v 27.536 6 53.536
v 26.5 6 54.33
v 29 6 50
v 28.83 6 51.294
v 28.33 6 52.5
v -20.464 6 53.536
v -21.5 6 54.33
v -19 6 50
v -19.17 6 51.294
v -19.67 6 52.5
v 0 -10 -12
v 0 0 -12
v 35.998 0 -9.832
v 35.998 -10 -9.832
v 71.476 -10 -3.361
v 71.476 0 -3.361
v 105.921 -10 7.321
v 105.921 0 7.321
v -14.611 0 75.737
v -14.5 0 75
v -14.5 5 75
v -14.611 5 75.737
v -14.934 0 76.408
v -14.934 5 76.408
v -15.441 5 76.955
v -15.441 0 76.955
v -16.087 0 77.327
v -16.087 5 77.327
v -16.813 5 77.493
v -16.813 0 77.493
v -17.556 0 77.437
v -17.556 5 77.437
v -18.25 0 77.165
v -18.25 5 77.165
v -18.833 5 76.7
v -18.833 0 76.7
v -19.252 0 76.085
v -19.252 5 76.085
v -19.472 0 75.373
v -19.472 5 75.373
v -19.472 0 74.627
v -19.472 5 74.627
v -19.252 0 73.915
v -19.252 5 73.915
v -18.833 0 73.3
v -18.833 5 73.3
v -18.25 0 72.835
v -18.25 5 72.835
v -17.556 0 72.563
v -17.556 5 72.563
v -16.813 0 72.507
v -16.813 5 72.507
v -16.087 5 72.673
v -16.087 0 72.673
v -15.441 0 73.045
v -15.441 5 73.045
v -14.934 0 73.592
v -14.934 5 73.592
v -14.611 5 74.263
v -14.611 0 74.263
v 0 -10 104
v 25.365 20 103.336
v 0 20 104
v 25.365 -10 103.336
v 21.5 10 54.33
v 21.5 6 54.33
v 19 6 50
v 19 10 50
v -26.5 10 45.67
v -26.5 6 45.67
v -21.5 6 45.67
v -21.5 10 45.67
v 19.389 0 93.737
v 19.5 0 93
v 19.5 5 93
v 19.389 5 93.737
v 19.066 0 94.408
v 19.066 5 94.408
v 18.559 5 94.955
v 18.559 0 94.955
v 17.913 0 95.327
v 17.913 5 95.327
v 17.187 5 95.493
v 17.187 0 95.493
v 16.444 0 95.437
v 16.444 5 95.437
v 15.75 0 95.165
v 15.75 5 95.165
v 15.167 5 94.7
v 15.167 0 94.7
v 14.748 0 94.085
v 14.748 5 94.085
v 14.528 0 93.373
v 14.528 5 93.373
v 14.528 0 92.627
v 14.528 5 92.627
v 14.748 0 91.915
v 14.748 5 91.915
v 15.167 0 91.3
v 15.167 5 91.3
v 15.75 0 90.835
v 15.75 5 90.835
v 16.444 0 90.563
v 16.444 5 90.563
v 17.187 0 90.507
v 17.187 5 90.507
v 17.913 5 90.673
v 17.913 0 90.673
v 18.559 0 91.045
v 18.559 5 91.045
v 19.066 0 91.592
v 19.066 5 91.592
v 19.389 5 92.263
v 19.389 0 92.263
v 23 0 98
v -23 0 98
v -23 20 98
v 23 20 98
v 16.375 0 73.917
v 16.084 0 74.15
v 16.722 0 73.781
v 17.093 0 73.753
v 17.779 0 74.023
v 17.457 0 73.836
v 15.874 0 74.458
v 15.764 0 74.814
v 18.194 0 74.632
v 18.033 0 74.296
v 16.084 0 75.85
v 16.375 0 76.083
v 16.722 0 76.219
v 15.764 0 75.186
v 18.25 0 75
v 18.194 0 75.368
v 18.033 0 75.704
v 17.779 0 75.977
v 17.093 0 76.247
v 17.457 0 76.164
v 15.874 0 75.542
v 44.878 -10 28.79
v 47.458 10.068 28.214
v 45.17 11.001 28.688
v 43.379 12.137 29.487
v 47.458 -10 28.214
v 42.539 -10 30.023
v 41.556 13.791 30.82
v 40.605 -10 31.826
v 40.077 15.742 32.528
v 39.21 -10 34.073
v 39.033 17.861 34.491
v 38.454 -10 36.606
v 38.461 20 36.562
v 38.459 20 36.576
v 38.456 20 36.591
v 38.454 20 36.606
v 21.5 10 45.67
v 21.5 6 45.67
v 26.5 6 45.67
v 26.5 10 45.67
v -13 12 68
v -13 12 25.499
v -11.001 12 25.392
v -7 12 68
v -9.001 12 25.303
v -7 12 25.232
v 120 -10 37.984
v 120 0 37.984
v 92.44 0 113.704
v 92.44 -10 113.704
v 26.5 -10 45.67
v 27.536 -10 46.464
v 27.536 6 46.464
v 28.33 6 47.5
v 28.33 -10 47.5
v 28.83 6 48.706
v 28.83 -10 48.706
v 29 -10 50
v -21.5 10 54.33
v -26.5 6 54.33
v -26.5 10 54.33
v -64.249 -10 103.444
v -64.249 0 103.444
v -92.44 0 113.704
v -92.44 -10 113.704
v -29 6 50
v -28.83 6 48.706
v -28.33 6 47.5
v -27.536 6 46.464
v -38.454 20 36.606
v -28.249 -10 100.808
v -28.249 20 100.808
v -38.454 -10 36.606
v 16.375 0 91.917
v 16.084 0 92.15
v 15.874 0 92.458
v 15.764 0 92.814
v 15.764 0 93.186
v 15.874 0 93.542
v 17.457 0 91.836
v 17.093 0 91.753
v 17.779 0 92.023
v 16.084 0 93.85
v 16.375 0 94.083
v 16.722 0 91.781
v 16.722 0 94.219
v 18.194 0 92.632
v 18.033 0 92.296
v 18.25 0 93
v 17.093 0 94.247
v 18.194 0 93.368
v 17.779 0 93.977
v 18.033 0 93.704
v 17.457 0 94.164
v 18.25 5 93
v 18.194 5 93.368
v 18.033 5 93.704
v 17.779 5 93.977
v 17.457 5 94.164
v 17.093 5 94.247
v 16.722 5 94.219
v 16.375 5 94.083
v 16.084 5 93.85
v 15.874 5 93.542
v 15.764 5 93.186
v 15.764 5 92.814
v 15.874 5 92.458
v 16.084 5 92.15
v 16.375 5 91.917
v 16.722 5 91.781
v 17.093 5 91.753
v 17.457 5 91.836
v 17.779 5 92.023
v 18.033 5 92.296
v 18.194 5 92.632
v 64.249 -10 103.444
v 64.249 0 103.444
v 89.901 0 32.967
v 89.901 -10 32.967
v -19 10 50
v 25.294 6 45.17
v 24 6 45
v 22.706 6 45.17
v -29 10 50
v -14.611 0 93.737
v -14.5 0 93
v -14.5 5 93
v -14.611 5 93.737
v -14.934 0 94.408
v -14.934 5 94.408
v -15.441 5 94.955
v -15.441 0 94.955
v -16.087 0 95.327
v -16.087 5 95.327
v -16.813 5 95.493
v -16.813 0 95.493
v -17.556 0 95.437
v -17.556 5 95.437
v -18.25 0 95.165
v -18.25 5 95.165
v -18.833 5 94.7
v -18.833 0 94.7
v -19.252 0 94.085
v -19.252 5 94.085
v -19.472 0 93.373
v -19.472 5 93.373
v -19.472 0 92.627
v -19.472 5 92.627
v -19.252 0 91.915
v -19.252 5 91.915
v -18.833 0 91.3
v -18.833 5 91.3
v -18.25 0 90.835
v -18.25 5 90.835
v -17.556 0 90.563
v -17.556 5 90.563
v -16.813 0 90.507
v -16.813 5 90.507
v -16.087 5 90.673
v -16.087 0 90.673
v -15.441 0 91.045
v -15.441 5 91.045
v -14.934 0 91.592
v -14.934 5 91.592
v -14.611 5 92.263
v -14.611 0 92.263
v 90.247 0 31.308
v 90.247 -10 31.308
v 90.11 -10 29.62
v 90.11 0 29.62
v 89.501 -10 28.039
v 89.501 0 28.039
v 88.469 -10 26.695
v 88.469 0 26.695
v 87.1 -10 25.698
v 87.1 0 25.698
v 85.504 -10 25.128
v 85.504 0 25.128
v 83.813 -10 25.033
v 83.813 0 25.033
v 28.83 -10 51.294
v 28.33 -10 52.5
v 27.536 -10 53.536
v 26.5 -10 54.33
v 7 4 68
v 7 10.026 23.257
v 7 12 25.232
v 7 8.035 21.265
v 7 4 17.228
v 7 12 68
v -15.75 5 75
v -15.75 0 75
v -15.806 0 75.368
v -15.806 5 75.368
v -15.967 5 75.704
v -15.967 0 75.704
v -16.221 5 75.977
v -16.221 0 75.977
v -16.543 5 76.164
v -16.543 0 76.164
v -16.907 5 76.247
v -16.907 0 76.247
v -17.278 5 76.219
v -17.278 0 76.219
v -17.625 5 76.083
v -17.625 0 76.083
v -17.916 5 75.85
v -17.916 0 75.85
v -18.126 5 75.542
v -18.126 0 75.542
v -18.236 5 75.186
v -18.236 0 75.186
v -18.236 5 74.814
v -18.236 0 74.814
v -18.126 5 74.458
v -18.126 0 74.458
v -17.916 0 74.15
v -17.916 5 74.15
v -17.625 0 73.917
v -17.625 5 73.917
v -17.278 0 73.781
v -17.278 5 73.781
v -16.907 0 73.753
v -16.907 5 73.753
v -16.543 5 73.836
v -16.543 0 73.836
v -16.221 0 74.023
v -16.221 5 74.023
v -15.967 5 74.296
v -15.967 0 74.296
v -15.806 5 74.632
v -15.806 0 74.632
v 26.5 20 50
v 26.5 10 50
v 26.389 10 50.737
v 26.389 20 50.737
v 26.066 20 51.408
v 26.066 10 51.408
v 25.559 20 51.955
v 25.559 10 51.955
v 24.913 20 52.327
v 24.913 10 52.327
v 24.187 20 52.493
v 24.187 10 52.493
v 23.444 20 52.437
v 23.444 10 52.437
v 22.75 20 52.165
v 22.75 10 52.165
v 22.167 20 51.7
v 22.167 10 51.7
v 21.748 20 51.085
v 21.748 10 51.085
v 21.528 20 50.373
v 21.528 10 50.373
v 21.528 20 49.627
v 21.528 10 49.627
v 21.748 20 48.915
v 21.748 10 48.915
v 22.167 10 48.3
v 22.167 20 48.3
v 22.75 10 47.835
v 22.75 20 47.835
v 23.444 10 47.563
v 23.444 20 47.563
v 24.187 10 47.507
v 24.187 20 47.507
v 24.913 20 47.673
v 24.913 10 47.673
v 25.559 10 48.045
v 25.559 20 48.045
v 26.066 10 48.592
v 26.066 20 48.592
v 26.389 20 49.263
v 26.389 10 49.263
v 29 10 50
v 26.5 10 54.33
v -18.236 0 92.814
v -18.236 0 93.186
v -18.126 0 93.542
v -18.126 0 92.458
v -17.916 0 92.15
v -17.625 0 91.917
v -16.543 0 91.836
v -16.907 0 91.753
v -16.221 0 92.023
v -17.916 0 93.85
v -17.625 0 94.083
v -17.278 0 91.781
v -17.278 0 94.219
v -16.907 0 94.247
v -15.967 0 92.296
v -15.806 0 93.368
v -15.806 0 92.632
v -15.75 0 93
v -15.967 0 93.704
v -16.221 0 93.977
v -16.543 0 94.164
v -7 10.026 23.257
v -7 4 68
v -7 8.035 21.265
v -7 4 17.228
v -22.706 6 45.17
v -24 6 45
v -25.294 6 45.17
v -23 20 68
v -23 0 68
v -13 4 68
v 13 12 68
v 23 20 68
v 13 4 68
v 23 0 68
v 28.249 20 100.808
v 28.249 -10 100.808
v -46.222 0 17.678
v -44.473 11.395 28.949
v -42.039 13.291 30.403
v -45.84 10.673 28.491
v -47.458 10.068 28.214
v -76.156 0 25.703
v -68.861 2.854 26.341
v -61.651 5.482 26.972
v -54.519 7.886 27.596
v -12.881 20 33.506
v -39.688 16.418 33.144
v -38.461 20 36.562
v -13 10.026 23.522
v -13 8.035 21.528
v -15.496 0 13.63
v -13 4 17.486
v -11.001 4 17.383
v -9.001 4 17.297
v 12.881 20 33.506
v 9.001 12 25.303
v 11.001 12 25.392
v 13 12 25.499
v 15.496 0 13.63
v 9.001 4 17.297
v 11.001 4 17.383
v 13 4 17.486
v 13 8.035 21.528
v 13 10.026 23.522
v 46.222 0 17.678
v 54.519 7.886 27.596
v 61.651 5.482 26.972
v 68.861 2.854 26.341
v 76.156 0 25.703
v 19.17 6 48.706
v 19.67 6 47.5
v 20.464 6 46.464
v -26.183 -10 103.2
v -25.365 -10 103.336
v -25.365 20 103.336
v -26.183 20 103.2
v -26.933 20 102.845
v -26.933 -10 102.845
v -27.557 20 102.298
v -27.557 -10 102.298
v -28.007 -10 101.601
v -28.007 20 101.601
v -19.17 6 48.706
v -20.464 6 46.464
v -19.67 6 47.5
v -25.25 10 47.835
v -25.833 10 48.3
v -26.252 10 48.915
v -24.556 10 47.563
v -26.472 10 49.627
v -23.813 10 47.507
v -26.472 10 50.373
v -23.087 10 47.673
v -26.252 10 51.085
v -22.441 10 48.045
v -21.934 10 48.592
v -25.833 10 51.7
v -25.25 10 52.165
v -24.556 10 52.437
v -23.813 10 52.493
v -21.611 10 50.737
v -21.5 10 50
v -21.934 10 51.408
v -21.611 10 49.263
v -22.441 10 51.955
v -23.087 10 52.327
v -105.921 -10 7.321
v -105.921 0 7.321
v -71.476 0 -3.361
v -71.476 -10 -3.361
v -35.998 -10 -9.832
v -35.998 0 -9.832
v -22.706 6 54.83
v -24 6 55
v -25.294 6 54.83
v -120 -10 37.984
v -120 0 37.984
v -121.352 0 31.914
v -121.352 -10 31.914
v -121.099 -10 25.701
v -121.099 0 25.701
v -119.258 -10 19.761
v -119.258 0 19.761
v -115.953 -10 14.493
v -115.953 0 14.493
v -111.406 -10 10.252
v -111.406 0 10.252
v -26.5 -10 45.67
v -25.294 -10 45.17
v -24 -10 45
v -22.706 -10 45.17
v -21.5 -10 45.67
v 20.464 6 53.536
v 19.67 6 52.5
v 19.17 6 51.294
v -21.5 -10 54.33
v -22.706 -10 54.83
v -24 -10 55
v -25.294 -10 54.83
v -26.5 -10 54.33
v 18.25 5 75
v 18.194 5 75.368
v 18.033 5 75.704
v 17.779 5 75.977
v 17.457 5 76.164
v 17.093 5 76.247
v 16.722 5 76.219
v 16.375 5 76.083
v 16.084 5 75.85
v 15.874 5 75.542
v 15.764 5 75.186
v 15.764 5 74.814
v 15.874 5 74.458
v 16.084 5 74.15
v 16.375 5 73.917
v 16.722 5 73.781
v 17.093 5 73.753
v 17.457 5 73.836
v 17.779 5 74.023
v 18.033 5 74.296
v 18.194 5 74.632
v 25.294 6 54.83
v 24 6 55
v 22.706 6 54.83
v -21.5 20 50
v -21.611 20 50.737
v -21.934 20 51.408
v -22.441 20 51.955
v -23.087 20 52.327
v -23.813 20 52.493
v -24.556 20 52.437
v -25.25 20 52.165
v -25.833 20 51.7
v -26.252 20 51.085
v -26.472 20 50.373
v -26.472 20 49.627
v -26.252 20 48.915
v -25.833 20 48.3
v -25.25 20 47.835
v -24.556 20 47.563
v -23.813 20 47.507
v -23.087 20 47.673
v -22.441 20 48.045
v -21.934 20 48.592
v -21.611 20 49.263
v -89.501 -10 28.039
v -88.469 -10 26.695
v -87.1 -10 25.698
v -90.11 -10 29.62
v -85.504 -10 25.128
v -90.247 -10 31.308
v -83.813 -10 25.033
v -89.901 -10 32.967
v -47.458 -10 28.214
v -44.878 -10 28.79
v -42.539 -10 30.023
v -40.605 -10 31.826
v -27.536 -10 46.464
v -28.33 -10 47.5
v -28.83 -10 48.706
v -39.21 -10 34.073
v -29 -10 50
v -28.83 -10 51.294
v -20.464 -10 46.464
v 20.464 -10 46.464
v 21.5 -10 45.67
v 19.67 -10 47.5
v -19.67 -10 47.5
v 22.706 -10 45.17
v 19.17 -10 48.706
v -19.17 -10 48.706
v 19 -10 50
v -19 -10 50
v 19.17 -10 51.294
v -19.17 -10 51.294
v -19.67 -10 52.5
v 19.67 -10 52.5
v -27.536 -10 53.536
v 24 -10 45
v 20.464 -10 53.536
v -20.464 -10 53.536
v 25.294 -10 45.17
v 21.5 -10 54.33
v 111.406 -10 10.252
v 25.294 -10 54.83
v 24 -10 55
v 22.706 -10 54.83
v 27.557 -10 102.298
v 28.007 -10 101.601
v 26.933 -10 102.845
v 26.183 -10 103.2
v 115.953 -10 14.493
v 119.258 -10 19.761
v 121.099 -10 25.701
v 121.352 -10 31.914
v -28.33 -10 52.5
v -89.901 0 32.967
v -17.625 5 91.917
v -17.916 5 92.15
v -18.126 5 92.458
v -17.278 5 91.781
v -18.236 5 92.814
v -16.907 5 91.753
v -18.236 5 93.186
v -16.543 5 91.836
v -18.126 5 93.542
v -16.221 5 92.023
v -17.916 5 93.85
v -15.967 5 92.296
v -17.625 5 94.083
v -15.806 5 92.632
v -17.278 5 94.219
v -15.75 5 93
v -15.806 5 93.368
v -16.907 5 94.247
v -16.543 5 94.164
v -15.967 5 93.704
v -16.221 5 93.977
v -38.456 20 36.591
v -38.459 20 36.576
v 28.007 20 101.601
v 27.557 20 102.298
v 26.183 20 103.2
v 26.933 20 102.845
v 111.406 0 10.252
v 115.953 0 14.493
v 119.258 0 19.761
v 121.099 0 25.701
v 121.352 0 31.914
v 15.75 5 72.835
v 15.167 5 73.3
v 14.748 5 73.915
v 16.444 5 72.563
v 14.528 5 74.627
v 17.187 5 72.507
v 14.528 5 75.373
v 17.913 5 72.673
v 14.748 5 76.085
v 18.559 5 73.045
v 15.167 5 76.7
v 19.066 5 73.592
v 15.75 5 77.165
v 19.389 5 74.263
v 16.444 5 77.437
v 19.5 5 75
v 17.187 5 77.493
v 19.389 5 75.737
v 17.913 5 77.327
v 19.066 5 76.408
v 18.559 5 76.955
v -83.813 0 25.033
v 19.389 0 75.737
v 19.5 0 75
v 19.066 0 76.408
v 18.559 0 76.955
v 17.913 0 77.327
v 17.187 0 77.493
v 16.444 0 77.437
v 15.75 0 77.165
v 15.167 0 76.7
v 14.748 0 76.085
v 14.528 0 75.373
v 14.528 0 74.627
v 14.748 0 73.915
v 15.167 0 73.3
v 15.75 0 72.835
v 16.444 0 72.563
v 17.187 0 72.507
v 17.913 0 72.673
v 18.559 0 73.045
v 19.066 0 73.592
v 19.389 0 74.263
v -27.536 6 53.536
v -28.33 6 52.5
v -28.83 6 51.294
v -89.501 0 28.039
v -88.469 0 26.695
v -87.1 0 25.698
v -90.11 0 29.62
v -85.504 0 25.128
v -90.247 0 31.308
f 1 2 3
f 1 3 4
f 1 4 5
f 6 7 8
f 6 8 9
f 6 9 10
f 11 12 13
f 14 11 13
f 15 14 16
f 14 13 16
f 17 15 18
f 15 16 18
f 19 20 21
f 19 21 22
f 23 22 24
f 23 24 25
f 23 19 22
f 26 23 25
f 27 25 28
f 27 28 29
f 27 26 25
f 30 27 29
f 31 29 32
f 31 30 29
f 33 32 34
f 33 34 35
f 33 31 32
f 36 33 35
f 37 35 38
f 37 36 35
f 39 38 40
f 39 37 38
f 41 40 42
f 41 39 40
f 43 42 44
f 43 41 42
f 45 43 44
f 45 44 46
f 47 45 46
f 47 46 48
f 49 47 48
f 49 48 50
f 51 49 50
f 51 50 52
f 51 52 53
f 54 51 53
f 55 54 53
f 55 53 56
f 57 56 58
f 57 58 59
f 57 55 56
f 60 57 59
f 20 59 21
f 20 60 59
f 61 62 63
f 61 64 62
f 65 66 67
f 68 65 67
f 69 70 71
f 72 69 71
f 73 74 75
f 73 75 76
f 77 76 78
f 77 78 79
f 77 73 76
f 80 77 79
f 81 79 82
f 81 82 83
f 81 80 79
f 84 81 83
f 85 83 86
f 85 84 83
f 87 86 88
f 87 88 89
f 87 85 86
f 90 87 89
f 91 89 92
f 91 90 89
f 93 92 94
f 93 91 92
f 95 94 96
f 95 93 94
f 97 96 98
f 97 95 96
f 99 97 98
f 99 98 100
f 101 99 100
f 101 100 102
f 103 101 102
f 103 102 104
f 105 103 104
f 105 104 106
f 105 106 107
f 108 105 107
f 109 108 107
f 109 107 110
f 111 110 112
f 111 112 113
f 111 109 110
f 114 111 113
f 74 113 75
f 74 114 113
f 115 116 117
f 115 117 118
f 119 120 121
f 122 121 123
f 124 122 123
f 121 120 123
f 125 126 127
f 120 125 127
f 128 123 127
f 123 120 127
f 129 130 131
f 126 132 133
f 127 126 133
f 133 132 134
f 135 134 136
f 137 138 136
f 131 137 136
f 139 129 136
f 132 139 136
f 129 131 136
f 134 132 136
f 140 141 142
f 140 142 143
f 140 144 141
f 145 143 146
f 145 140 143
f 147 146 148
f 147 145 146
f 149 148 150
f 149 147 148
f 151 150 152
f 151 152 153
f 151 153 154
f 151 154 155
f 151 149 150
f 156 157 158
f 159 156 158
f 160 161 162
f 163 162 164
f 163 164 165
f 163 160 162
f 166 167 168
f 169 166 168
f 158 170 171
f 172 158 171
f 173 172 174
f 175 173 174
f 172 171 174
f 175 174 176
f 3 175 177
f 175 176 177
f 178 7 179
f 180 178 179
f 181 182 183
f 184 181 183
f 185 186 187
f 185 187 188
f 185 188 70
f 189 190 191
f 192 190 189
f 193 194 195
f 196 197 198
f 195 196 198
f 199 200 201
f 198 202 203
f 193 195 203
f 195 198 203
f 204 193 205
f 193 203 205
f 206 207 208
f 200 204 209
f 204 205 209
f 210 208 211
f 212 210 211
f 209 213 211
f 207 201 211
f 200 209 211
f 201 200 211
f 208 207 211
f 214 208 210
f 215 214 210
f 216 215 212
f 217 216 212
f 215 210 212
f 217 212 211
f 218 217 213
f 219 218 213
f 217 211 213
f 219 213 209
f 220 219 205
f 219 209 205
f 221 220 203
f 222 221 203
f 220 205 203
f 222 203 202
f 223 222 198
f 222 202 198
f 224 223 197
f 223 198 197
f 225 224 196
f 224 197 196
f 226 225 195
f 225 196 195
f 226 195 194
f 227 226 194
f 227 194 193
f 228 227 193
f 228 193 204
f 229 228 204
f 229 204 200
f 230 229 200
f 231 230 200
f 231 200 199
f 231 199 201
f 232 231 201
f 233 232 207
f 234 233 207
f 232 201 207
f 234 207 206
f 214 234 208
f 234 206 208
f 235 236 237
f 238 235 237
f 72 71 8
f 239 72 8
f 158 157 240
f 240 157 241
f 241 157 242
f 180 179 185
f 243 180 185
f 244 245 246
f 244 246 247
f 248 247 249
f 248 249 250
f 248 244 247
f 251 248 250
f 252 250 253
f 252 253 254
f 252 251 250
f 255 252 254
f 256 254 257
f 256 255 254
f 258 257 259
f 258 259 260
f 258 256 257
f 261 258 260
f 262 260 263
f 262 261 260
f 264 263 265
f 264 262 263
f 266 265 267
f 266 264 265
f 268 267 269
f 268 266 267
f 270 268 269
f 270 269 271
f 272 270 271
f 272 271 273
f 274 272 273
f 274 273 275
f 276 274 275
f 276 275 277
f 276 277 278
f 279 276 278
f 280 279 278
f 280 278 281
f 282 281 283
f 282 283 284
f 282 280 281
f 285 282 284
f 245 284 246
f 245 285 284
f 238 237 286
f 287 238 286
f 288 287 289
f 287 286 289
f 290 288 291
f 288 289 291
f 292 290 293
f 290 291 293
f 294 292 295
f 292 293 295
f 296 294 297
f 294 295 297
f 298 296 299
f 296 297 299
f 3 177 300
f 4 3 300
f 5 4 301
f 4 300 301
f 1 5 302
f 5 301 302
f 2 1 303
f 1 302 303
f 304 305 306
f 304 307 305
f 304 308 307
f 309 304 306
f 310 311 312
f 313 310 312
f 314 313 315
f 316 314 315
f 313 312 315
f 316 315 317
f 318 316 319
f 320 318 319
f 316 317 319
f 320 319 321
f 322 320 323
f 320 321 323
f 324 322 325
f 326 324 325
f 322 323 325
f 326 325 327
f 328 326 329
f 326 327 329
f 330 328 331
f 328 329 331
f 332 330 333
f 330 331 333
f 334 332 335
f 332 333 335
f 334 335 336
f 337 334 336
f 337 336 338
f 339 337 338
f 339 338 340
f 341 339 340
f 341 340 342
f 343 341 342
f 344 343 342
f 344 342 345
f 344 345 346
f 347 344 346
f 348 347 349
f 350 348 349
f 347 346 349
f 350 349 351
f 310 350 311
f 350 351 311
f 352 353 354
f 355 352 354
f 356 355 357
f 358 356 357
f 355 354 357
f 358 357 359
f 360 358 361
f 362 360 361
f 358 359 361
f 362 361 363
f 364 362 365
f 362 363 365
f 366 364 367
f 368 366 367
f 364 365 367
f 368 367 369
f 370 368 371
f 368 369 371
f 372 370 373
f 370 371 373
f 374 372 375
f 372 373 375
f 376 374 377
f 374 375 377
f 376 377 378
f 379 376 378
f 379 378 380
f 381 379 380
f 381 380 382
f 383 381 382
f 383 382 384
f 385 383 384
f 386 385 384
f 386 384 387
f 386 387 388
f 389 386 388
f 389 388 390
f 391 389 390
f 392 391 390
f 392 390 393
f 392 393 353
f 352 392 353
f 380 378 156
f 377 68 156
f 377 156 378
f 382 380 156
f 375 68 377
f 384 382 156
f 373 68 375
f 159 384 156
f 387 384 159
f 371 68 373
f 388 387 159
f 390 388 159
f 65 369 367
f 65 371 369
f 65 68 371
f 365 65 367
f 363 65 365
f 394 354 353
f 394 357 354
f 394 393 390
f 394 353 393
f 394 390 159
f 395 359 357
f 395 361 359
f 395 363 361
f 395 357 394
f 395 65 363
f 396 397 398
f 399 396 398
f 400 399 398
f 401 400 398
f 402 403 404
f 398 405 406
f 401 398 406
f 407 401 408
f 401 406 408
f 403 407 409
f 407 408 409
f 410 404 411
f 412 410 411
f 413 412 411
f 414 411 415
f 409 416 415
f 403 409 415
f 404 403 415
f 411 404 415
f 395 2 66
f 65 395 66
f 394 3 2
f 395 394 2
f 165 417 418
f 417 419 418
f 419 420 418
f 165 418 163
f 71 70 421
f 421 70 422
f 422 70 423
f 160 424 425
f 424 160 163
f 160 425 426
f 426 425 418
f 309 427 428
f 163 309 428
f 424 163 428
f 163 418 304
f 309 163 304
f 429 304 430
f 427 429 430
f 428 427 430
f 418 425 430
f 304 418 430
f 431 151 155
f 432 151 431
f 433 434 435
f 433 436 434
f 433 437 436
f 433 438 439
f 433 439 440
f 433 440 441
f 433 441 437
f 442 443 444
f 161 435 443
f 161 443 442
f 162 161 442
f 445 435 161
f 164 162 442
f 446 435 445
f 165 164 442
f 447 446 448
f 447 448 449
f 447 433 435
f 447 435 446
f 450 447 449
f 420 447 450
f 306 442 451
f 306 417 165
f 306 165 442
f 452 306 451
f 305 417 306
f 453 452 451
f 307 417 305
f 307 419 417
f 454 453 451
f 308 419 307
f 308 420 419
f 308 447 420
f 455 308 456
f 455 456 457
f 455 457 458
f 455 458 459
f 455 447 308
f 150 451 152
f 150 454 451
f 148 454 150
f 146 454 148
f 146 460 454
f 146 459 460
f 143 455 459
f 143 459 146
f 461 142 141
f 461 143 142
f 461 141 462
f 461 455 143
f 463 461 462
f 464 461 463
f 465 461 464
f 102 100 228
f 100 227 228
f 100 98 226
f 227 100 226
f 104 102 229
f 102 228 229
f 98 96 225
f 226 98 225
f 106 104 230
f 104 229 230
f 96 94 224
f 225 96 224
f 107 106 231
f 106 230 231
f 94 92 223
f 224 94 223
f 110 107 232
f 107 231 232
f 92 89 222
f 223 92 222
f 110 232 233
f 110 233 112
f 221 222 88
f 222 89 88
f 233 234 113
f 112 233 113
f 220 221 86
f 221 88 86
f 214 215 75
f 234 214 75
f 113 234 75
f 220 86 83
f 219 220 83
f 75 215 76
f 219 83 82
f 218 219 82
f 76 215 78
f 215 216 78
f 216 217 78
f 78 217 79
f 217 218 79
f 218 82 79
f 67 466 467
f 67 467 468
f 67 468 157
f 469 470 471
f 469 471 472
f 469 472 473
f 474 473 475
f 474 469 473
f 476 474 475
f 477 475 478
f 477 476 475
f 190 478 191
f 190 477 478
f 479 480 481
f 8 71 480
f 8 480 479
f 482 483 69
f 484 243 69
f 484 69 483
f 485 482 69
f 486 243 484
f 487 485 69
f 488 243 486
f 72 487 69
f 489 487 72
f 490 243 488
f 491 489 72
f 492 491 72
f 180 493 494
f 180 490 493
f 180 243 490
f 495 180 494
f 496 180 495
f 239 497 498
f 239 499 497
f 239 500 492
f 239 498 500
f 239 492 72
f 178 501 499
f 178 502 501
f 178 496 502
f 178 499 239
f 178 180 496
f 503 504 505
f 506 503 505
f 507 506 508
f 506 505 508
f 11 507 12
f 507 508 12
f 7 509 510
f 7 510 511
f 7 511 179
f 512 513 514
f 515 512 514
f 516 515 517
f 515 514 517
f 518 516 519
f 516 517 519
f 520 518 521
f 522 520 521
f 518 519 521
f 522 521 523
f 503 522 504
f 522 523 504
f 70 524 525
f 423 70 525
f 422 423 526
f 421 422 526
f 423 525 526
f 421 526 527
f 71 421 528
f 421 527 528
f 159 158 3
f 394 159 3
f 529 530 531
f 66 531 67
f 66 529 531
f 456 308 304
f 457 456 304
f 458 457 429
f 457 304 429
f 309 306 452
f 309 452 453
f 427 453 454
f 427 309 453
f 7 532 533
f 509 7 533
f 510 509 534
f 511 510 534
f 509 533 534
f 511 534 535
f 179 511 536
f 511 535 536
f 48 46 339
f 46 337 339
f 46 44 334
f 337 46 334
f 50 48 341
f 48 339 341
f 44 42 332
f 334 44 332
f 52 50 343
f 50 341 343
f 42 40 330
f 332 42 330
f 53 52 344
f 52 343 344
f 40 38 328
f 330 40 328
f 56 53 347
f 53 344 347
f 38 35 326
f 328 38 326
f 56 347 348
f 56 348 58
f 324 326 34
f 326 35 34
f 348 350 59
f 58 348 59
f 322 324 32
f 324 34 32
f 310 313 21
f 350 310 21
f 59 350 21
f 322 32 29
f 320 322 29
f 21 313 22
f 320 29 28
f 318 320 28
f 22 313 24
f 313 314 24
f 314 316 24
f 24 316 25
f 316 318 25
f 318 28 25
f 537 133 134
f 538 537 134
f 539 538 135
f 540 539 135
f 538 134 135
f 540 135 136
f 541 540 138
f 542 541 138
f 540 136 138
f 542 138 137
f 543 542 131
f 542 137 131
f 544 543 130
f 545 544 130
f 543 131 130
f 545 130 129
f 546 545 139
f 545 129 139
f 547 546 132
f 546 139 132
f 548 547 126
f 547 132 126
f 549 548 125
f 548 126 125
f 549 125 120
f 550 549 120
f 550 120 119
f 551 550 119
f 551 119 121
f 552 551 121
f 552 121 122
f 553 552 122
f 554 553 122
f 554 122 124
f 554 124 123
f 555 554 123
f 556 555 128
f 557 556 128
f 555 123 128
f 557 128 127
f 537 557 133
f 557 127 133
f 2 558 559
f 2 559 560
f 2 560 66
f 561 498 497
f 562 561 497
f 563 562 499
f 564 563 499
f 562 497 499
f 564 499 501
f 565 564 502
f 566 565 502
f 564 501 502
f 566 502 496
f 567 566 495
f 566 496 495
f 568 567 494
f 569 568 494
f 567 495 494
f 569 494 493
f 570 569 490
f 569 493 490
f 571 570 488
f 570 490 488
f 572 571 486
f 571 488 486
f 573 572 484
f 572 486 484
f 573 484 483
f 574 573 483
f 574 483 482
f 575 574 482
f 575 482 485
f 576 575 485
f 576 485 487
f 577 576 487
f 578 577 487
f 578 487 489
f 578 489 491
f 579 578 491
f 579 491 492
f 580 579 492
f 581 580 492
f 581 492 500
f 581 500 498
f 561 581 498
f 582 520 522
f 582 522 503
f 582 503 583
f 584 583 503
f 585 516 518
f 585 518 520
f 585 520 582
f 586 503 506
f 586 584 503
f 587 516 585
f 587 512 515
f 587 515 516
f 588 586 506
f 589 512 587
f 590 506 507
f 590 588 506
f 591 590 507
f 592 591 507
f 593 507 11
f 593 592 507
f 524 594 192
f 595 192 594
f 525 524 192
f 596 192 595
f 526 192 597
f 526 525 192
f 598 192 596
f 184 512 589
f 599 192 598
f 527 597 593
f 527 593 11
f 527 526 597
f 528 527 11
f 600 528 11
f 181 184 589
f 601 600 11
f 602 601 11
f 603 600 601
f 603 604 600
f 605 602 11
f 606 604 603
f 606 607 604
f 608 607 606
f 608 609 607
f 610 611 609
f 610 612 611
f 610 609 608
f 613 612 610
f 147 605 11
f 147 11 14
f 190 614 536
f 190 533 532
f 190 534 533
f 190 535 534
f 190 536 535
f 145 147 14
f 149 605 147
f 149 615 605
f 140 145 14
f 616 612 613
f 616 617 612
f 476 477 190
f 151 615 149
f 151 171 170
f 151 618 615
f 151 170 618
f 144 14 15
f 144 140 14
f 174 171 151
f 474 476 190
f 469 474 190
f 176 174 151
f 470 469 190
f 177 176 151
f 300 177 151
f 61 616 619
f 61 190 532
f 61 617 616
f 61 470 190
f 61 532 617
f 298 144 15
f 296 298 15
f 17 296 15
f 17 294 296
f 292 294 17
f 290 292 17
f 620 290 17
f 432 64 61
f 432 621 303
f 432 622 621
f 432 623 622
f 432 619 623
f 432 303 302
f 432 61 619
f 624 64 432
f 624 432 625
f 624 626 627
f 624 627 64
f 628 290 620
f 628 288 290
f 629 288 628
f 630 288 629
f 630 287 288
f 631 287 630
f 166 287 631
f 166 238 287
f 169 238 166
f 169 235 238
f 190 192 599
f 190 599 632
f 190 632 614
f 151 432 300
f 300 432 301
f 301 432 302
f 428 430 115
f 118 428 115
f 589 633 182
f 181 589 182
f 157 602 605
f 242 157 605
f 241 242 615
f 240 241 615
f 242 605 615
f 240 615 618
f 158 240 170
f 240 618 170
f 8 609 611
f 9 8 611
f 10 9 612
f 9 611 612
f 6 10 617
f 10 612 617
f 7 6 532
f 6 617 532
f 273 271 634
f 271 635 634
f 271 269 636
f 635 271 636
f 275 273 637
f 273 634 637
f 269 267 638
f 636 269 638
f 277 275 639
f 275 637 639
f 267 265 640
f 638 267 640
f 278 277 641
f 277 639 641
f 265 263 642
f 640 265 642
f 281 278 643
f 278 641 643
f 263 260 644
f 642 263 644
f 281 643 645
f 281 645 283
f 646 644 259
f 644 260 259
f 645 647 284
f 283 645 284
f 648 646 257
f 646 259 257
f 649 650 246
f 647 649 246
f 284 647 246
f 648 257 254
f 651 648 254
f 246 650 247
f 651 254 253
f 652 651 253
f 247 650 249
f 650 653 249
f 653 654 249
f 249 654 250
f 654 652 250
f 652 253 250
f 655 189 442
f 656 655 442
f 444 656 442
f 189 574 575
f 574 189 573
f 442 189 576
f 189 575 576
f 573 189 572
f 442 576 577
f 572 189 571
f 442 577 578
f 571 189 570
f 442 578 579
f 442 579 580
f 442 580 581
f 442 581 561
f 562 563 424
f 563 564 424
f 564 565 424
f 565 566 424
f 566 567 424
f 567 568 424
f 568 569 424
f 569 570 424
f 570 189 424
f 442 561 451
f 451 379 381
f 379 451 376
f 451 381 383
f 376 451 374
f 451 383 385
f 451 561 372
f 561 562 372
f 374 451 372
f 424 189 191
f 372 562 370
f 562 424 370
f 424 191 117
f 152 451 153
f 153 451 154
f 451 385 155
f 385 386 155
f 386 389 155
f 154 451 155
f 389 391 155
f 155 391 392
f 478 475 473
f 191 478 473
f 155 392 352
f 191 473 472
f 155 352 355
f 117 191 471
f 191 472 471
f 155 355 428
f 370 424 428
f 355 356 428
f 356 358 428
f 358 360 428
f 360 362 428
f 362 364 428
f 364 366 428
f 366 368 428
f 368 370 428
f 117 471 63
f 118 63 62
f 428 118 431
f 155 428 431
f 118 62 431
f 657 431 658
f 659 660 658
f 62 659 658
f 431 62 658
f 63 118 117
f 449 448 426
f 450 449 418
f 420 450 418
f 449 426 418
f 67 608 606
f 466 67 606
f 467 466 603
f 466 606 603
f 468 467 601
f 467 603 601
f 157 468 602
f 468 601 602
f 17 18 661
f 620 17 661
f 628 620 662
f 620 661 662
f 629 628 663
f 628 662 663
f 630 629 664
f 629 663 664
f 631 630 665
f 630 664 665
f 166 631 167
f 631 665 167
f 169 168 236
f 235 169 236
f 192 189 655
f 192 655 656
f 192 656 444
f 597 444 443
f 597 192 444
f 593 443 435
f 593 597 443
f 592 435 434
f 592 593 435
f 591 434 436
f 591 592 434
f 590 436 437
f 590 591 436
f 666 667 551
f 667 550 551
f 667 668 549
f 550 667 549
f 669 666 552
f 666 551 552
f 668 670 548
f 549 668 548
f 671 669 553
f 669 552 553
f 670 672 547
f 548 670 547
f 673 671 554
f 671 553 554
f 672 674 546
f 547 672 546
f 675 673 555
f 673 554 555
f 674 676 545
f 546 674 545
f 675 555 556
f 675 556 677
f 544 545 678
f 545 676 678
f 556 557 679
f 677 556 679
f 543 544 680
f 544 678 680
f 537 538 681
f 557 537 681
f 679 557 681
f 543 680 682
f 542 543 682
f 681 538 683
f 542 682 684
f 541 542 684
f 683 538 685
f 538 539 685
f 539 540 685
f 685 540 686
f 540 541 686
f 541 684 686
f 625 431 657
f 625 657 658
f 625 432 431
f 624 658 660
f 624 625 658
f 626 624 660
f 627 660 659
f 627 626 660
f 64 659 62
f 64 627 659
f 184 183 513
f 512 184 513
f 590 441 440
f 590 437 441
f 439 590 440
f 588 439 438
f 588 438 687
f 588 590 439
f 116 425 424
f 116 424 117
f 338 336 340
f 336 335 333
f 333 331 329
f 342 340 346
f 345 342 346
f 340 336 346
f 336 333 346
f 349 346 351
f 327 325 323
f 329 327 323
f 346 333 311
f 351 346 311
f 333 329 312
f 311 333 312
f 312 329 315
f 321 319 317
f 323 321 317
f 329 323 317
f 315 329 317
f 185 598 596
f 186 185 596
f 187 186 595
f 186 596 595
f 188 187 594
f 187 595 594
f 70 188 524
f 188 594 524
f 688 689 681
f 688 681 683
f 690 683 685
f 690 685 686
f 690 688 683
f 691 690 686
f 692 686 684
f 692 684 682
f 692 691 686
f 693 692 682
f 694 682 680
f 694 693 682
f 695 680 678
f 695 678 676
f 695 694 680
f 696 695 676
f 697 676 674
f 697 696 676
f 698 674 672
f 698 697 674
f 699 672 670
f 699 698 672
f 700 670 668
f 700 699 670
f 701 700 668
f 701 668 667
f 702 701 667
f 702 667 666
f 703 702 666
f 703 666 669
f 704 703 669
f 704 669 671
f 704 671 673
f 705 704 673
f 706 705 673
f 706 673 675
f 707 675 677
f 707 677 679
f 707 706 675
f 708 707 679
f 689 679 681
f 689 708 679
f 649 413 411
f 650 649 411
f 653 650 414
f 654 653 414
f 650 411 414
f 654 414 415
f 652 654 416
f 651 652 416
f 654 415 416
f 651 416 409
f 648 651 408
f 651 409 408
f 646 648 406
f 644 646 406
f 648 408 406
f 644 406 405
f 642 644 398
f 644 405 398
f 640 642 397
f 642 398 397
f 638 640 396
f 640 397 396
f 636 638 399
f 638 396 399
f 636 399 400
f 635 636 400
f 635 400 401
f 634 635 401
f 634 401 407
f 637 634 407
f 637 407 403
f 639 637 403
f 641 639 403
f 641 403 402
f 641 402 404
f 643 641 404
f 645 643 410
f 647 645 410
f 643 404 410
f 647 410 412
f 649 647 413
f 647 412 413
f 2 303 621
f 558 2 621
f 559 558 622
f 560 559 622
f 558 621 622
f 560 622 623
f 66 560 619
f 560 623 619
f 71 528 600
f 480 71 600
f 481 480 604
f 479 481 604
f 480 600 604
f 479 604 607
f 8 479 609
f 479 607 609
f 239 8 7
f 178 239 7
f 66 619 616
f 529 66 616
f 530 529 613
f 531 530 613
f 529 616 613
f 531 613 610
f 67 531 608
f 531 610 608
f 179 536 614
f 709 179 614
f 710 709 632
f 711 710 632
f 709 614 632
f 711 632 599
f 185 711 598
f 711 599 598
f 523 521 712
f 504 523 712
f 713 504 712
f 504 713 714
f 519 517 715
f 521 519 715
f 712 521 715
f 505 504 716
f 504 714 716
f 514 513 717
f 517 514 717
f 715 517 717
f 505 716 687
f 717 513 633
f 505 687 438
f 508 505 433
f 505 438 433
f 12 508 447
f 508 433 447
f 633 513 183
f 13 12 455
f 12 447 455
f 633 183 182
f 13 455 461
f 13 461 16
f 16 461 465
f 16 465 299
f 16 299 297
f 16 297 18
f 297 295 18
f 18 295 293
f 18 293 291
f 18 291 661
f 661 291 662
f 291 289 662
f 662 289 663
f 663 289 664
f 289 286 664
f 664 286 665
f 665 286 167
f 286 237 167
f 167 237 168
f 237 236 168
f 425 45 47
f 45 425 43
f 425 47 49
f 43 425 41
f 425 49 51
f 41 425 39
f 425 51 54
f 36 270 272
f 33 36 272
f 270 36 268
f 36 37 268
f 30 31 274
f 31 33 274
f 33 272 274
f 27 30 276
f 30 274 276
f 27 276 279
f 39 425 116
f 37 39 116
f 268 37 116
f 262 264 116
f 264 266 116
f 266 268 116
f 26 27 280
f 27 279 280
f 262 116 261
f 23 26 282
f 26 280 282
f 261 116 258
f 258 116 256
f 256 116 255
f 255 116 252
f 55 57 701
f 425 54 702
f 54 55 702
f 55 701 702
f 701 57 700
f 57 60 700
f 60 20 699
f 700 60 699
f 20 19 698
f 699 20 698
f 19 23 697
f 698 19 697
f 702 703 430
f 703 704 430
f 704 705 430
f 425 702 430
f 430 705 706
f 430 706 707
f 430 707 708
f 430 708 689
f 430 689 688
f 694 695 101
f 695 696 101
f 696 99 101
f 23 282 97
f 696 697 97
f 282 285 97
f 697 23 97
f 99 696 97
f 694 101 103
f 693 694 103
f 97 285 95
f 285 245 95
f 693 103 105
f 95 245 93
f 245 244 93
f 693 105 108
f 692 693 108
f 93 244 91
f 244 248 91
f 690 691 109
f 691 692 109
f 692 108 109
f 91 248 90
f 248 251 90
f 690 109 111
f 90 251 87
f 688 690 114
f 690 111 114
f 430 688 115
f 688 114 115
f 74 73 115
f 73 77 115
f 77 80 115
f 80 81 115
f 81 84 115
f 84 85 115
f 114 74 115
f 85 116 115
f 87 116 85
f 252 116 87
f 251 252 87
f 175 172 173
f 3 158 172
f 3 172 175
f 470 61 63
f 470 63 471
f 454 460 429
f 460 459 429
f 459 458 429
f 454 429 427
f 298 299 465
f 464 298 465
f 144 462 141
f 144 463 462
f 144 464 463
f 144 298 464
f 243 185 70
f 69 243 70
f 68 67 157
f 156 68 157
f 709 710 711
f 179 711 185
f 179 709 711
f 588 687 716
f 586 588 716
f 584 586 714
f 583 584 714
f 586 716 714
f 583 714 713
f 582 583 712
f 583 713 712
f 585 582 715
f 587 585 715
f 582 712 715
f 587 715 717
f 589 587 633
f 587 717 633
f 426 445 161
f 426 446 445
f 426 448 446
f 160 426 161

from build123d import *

# Parameters (mm, degrees)
F0_W        = 46
F0_H        = 30
F0_R        = 2.5
F0_R_2      = 1.25
F1_DEPTH    = 10
F2_DEPTH    = 20
F3_R        = 2.5
F4_DEPTH    = 30
F5_DEPTH    = 20
F6_DEPTH    = 16
F7_DEPTH    = 5
F8_T4_ANGLE = 69.3687445925
F9_W        = 6
F9_H        = 8
F10_REACH   = 90.001


# Not quite as in the source:
# - a fillet or chamfer that OpenCascade refuses, or shapes differently, is made with other operations: its cross-section is extruded or revolved along the edge and cut away or added
# - a feature names something its author has since deleted; it is built from what else it names


with BuildPart() as f1:
    # F0 (on Front) → F1 (new body)
    with BuildSketch(Plane.XZ):
        with BuildLine():
            Line((25.3649208898, 103.335796171), (0, 104))
            Line((0, 104), (-25.3649208898, 103.335796171))
            ThreePointArc((-25.3649208898, 103.335796171), (-27.2638102508, 102.5928847735), (-28.2491977972, 100.8077490551))
            Line((-28.2491977972, 100.8077490551), (-38.4537664635, 36.6060519686))
            ThreePointArc((-38.4537664635, 36.6060519686), (-41.511810122, 30.8603986419), (-47.4582348771, 28.2138545179))
            Line((-47.4582348771, 28.2138545179), (-83.8130942566, 25.0332164582))
            ThreePointArc((-83.8130942566, 25.0332164582), (0, 9.922889923), (83.8130942566, 25.0332164582))
            Line((83.8130942566, 25.0332164582), (47.4582348771, 28.2138545179))
            ThreePointArc((47.4582348771, 28.2138545179), (41.511810122, 30.8603986419), (38.4537664635, 36.6060519686))
            Line((38.4537664635, 36.6060519686), (28.2491977972, 100.8077490551))
            ThreePointArc((28.2491977972, 100.8077490551), (27.2638102508, 102.5928847735), (25.3649208898, 103.335796171))
        make_face()
        with Locations((0, 83)):
            Rectangle(F0_W, F0_H, mode=Mode.SUBTRACT)
        with Locations((0, 83)):
            Rectangle(F0_W, F0_H)
        with Locations((-17, 75)):
            Circle(F0_R, mode=Mode.SUBTRACT)
        with Locations((-17, 93)):
            Circle(F0_R, mode=Mode.SUBTRACT)
        with Locations((17, 75)):
            Circle(F0_R, mode=Mode.SUBTRACT)
        with Locations((17, 93)):
            Circle(F0_R, mode=Mode.SUBTRACT)
        with Locations((17, 93)):
            Circle(F0_R)
        with Locations((17, 93)):
            Circle(F0_R_2, mode=Mode.SUBTRACT)
        with Locations((17, 75)):
            Circle(F0_R)
        with Locations((17, 75)):
            Circle(F0_R_2, mode=Mode.SUBTRACT)
        with Locations((-17, 93)):
            Circle(F0_R)
        with Locations((-17, 93)):
            Circle(F0_R_2, mode=Mode.SUBTRACT)
        with Locations((-17, 75)):
            Circle(F0_R)
        with Locations((-17, 75)):
            Circle(F0_R_2, mode=Mode.SUBTRACT)
        with Locations((17, 93)):
            Circle(F0_R_2)
        with Locations((-17, 93)):
            Circle(F0_R_2)
        with Locations((-17, 75)):
            Circle(F0_R_2)
        with Locations((17, 75)):
            Circle(F0_R_2)
        with BuildLine():
            ThreePointArc((83.8130942566, 25.0332164582), (0, 9.922889923), (-83.8130942566, 25.0332164582))
            ThreePointArc((-83.8130942566, 25.0332164582), (-89.0331441362, 27.330093377), (-89.9007085466, 32.9667498611))
            Line((-89.9007085466, 32.9667498611), (-64.2491977972, 103.44369642))
            Line((-64.2491977972, 103.44369642), (-92.4399764208, 113.7043007198))
            Line((-92.4399764208, 113.7043007198), (-120, 37.9837582563))
            ThreePointArc((-120, 37.9837582563), (-119.2581515912, 19.7607795149), (-105.9210620665, 7.3209508875))
            ThreePointArc((-105.9210620665, 7.3209508875), (-53.8344000907, -7.1302379745), (0, -12))
            ThreePointArc((0, -12), (53.8344000907, -7.1302379745), (105.9210620665, 7.3209508875))
            ThreePointArc((105.9210620665, 7.3209508875), (119.2581515912, 19.7607795149), (120, 37.9837582563))
            Line((120, 37.9837582563), (92.4399764208, 113.7043007198))
            Line((92.4399764208, 113.7043007198), (64.2491977972, 103.44369642))
            Line((64.2491977972, 103.44369642), (89.9007085466, 32.9667498611))
            ThreePointArc((89.9007085466, 32.9667498611), (89.0331441362, 27.330093377), (83.8130942566, 25.0332164582))
        make_face()
    extrude(amount=F1_DEPTH)

    # F0 (on Front) → F2 (join)
    with BuildSketch(Plane.XZ):
        with BuildLine():
            Line((25.3649208898, 103.335796171), (0, 104))
            Line((0, 104), (-25.3649208898, 103.335796171))
            ThreePointArc((-25.3649208898, 103.335796171), (-27.2638102508, 102.5928847735), (-28.2491977972, 100.8077490551))
            Line((-28.2491977972, 100.8077490551), (-38.4537664635, 36.6060519686))
            ThreePointArc((-38.4537664635, 36.6060519686), (-41.511810122, 30.8603986419), (-47.4582348771, 28.2138545179))
            Line((-47.4582348771, 28.2138545179), (-83.8130942566, 25.0332164582))
            ThreePointArc((-83.8130942566, 25.0332164582), (0, 9.922889923), (83.8130942566, 25.0332164582))
            Line((83.8130942566, 25.0332164582), (47.4582348771, 28.2138545179))
            ThreePointArc((47.4582348771, 28.2138545179), (41.511810122, 30.8603986419), (38.4537664635, 36.6060519686))
            Line((38.4537664635, 36.6060519686), (28.2491977972, 100.8077490551))
            ThreePointArc((28.2491977972, 100.8077490551), (27.2638102508, 102.5928847735), (25.3649208898, 103.335796171))
        make_face()
        with Locations((0, 83)):
            Rectangle(F0_W, F0_H, mode=Mode.SUBTRACT)
    extrude(amount=-F2_DEPTH)

    # F3 (on face) → F4 (cut, through all)
    with BuildSketch(Plane.XZ.offset(10)):
        with Locations((-24, 50)):
            Circle(F3_R)
        with Locations((24, 50)):
            Circle(F3_R)
    extrude(amount=-F4_DEPTH, mode=Mode.SUBTRACT)

    # F3 (on face) → F5 (cut, through all)
    with BuildSketch(Plane.XZ.offset(10)):
        Polygon((-21.5, 45.6698729811), (-19, 50), (-21.5, 54.3301270189), (-26.5, 54.3301270189), (-29, 50), (-26.5, 45.6698729811), align=None)
        with Locations((-24, 50)):
            Circle(F3_R, mode=Mode.SUBTRACT)
        Polygon((26.5, 45.6698729811), (29, 50), (26.5, 54.3301270189), (21.5, 54.3301270189), (19, 50), (21.5, 45.6698729811), align=None)
        with Locations((24, 50)):
            Circle(F3_R, mode=Mode.SUBTRACT)
    extrude(amount=-F5_DEPTH, mode=Mode.SUBTRACT)

    # F3 (on face) → F6 (cut, through all)
    with BuildSketch(Plane.XZ.offset(10)):
        with BuildLine():
            ThreePointArc((-29, 50), (-28.3301270189, 47.5), (-26.5, 45.6698729811))
            Line((-26.5, 45.6698729811), (-29, 50))
        make_face()
        with BuildLine():
            Line((-29, 50), (-26.5, 54.3301270189))
            ThreePointArc((-26.5, 54.3301270189), (-28.3301270189, 52.5), (-29, 50))
        make_face()
        with BuildLine():
            Line((-26.5, 54.3301270189), (-21.5, 54.3301270189))
            ThreePointArc((-21.5, 54.3301270189), (-24, 55), (-26.5, 54.3301270189))
        make_face()
        with BuildLine():
            Line((-21.5, 54.3301270189), (-19, 50))
            ThreePointArc((-19, 50), (-19.6698729811, 52.5), (-21.5, 54.3301270189))
        make_face()
        with BuildLine():
            ThreePointArc((-21.5, 45.6698729811), (-19.6698729811, 47.5), (-19, 50))
            Line((-19, 50), (-21.5, 45.6698729811))
        make_face()
        with BuildLine():
            ThreePointArc((-26.5, 45.6698729811), (-24, 45), (-21.5, 45.6698729811))
            Line((-21.5, 45.6698729811), (-26.5, 45.6698729811))
        make_face()
        with BuildLine():
            Line((19, 50), (21.5, 54.3301270189))
            ThreePointArc((21.5, 54.3301270189), (19.6698729811, 52.5), (19, 50))
        make_face()
        with BuildLine():
            Line((21.5, 54.3301270189), (26.5, 54.3301270189))
            ThreePointArc((26.5, 54.3301270189), (24, 55), (21.5, 54.3301270189))
        make_face()
        with BuildLine():
            Line((26.5, 54.3301270189), (29, 50))
            ThreePointArc((29, 50), (28.3301270189, 52.5), (26.5, 54.3301270189))
        make_face()
        with BuildLine():
            ThreePointArc((26.5, 45.6698729811), (28.3301270189, 47.5), (29, 50))
            Line((29, 50), (26.5, 45.6698729811))
        make_face()
        with BuildLine():
            ThreePointArc((21.5, 45.6698729811), (24, 45), (26.5, 45.6698729811))
            Line((26.5, 45.6698729811), (21.5, 45.6698729811))
        make_face()
        with BuildLine():
            ThreePointArc((19, 50), (19.6698729811, 47.5), (21.5, 45.6698729811))
            Line((21.5, 45.6698729811), (19, 50))
        make_face()
    extrude(amount=-F6_DEPTH, mode=Mode.SUBTRACT)

    # F0 (on Front) → F7 (join)
    with BuildSketch(Plane.XZ):
        with Locations((17, 93)):
            Circle(F0_R)
        with Locations((17, 93)):
            Circle(F0_R_2, mode=Mode.SUBTRACT)
        with Locations((17, 75)):
            Circle(F0_R)
        with Locations((17, 75)):
            Circle(F0_R_2, mode=Mode.SUBTRACT)
        with Locations((-17, 75)):
            Circle(F0_R)
        with Locations((-17, 75)):
            Circle(F0_R_2, mode=Mode.SUBTRACT)
        with Locations((-17, 93)):
            Circle(F0_R)
        with Locations((-17, 93)):
            Circle(F0_R_2, mode=Mode.SUBTRACT)
    extrude(amount=-F7_DEPTH)

    # F8: chamfer of 23.2 on 1 edges, made by hand


with BuildPart() as f8_tool2:
    # F8_s3 → F8_t4 (revolve)
    with BuildSketch(Plane(origin=(-116.9473505208, 0, 80.9310017088), x_dir=(0, 1, 0), z_dir=(-0.8222992842, 0, 0.5690552585))):
        Polygon((20, 11.2885865066), (-3.2, 34.4885865066), (20, 34.4885865066), align=None)
    revolve(axis=Axis((0, 20, 249.922889923), (0, -1, 0)), revolution_arc=F8_T4_ANGLE)

    split(bisect_by=Plane.XZ, keep=Keep.BOTTOM)


with BuildPart() as f1_1:
    add(f1.part)

    # F8_t1: cut F8_tool2
    add(f8_tool2.part, mode=Mode.SUBTRACT)

    f10_end = f1_1.faces().sort_by_distance((0, 10, 23.1228899231))[0]
    # F9 (on face) → F10 (cut, up to a face of the model that its end follows)
    with BuildSketch(Plane.XY.offset(68)):
        with Locations((10, 8)):
            Rectangle(F9_W, F9_H)
        with Locations((-10, 8)):
            Rectangle(F9_W, F9_H)
    f10_long = extrude(amount=-F10_REACH, mode=Mode.PRIVATE)
    add(split(f10_long, bisect_by=f10_end, keep=Keep.BOTTOM, mode=Mode.PRIVATE), mode=Mode.SUBTRACT)


solid = f1_1.part
